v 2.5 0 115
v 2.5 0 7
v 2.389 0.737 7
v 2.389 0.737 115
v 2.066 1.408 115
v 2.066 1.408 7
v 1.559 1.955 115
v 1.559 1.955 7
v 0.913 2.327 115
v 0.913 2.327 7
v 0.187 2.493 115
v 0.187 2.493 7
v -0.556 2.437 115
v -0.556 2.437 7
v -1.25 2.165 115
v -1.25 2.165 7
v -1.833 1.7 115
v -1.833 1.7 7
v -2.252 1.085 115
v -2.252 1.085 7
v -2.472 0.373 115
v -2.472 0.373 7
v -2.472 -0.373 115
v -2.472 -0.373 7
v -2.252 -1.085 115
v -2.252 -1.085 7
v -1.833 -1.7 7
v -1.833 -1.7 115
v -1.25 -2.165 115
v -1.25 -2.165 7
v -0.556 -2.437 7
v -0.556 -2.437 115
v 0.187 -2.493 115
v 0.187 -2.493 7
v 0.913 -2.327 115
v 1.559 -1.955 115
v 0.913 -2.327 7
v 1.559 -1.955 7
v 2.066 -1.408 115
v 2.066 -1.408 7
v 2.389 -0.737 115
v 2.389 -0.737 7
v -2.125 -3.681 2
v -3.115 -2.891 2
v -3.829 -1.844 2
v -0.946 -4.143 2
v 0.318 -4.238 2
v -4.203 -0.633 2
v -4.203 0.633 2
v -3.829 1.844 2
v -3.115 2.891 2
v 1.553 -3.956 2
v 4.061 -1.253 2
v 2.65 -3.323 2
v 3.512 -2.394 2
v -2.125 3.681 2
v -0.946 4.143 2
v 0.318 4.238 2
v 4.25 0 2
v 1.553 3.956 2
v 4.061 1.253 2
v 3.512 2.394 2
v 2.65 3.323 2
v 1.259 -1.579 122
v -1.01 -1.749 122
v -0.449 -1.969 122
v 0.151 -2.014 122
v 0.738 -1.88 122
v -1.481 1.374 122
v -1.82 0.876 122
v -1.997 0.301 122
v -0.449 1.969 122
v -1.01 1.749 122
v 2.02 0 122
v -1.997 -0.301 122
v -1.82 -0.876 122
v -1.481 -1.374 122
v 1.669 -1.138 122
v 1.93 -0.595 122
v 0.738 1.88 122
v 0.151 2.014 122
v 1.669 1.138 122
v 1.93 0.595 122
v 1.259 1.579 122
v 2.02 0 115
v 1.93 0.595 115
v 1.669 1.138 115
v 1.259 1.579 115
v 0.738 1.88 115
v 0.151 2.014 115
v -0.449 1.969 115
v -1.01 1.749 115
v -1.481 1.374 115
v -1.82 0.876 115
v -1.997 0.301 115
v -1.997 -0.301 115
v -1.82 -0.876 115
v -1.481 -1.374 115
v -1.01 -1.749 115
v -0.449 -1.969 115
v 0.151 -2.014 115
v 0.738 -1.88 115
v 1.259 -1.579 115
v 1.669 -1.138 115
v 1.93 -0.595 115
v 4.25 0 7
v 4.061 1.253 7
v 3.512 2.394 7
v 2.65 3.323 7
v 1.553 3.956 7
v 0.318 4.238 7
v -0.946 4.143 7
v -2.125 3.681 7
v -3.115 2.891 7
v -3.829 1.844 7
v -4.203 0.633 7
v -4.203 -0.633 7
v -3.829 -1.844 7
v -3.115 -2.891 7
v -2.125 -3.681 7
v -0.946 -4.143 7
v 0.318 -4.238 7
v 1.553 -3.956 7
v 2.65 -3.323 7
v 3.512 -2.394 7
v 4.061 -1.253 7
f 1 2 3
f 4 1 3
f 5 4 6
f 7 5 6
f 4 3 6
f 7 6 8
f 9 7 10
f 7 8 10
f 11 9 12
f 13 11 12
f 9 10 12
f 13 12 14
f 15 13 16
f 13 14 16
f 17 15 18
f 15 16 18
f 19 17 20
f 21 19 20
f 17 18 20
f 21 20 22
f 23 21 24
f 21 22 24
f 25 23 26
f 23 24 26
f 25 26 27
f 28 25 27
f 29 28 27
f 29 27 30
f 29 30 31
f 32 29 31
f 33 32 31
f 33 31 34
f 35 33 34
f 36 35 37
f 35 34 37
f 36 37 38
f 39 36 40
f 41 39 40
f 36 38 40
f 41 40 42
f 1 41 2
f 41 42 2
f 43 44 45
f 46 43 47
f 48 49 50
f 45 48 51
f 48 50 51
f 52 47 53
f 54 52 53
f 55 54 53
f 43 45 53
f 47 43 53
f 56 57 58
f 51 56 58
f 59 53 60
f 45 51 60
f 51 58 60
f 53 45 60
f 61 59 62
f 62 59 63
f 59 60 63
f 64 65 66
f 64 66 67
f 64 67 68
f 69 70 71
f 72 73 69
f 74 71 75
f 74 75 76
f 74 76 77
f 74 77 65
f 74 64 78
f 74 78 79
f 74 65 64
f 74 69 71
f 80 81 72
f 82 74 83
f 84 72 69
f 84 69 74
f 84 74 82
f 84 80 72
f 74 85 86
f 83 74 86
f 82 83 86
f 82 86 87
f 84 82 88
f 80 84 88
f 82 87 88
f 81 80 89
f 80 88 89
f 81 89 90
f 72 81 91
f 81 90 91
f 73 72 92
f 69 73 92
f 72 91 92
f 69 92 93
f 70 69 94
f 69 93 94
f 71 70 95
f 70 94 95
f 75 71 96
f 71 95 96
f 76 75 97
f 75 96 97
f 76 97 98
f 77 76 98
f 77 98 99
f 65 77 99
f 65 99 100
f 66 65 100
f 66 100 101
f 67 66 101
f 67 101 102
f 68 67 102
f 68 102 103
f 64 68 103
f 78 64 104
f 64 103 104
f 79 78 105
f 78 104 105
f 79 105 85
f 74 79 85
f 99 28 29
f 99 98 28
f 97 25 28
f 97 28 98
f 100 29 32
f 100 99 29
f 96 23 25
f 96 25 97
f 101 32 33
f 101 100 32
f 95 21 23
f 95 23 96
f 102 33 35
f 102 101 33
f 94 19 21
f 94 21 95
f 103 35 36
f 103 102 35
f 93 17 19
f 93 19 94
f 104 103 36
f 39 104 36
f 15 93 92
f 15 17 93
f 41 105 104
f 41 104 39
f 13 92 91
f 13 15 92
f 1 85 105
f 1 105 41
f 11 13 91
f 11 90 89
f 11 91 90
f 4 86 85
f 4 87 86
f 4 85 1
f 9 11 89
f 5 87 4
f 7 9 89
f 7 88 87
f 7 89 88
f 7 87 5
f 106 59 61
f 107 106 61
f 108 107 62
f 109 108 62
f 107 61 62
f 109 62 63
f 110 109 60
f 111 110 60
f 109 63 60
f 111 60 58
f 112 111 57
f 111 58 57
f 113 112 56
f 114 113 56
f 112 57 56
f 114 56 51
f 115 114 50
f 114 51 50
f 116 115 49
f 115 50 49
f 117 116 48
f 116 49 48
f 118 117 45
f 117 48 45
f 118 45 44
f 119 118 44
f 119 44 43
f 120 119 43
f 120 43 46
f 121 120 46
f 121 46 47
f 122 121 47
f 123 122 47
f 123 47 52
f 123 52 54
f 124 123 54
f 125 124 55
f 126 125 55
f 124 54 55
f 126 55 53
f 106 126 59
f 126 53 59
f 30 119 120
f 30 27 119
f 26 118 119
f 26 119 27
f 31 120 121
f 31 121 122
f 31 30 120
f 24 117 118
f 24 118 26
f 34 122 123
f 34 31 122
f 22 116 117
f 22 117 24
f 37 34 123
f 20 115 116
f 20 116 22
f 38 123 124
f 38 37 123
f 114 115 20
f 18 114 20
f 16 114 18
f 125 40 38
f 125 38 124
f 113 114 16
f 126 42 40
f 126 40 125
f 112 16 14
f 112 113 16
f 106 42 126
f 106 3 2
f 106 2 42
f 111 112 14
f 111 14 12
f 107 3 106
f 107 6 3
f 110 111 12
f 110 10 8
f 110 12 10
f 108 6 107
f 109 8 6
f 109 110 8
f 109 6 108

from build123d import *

# Parameters (mm, degrees)
M5_START                                       = 7
SKETCH1_R                                      = 2.5
M5_MOUNTING_BOLT_SHANK_AND_REDUCED_THREA_DEPTH = 108
M5_START_2                                     = 115
SKETCH2_R                                      = 2.02
M5_TAP_ENGAGEMENT_DEPTH                        = 7
SOCKET_START                                   = 2
SKETCH3_R                                      = 4.25
SOCKET_CAP_HEAD_DEPTH                          = 5


with BuildPart() as part:
    # Sketch1 → M5 mounting bolt shank and reduced thread representation (new body)
    with BuildSketch(Plane.XY.offset(M5_START)):
        Circle(SKETCH1_R)
    extrude(amount=M5_MOUNTING_BOLT_SHANK_AND_REDUCED_THREA_DEPTH)

    # Sketch2 → M5 tap engagement (add)
    with BuildSketch(Plane.XY.offset(M5_START_2)):
        Circle(SKETCH2_R)
    extrude(amount=M5_TAP_ENGAGEMENT_DEPTH)

    # Sketch3 → Socket cap head (add)
    with BuildSketch(Plane.XY.offset(SOCKET_START)):
        Circle(SKETCH3_R)
    extrude(amount=SOCKET_CAP_HEAD_DEPTH)


solid = part.part
